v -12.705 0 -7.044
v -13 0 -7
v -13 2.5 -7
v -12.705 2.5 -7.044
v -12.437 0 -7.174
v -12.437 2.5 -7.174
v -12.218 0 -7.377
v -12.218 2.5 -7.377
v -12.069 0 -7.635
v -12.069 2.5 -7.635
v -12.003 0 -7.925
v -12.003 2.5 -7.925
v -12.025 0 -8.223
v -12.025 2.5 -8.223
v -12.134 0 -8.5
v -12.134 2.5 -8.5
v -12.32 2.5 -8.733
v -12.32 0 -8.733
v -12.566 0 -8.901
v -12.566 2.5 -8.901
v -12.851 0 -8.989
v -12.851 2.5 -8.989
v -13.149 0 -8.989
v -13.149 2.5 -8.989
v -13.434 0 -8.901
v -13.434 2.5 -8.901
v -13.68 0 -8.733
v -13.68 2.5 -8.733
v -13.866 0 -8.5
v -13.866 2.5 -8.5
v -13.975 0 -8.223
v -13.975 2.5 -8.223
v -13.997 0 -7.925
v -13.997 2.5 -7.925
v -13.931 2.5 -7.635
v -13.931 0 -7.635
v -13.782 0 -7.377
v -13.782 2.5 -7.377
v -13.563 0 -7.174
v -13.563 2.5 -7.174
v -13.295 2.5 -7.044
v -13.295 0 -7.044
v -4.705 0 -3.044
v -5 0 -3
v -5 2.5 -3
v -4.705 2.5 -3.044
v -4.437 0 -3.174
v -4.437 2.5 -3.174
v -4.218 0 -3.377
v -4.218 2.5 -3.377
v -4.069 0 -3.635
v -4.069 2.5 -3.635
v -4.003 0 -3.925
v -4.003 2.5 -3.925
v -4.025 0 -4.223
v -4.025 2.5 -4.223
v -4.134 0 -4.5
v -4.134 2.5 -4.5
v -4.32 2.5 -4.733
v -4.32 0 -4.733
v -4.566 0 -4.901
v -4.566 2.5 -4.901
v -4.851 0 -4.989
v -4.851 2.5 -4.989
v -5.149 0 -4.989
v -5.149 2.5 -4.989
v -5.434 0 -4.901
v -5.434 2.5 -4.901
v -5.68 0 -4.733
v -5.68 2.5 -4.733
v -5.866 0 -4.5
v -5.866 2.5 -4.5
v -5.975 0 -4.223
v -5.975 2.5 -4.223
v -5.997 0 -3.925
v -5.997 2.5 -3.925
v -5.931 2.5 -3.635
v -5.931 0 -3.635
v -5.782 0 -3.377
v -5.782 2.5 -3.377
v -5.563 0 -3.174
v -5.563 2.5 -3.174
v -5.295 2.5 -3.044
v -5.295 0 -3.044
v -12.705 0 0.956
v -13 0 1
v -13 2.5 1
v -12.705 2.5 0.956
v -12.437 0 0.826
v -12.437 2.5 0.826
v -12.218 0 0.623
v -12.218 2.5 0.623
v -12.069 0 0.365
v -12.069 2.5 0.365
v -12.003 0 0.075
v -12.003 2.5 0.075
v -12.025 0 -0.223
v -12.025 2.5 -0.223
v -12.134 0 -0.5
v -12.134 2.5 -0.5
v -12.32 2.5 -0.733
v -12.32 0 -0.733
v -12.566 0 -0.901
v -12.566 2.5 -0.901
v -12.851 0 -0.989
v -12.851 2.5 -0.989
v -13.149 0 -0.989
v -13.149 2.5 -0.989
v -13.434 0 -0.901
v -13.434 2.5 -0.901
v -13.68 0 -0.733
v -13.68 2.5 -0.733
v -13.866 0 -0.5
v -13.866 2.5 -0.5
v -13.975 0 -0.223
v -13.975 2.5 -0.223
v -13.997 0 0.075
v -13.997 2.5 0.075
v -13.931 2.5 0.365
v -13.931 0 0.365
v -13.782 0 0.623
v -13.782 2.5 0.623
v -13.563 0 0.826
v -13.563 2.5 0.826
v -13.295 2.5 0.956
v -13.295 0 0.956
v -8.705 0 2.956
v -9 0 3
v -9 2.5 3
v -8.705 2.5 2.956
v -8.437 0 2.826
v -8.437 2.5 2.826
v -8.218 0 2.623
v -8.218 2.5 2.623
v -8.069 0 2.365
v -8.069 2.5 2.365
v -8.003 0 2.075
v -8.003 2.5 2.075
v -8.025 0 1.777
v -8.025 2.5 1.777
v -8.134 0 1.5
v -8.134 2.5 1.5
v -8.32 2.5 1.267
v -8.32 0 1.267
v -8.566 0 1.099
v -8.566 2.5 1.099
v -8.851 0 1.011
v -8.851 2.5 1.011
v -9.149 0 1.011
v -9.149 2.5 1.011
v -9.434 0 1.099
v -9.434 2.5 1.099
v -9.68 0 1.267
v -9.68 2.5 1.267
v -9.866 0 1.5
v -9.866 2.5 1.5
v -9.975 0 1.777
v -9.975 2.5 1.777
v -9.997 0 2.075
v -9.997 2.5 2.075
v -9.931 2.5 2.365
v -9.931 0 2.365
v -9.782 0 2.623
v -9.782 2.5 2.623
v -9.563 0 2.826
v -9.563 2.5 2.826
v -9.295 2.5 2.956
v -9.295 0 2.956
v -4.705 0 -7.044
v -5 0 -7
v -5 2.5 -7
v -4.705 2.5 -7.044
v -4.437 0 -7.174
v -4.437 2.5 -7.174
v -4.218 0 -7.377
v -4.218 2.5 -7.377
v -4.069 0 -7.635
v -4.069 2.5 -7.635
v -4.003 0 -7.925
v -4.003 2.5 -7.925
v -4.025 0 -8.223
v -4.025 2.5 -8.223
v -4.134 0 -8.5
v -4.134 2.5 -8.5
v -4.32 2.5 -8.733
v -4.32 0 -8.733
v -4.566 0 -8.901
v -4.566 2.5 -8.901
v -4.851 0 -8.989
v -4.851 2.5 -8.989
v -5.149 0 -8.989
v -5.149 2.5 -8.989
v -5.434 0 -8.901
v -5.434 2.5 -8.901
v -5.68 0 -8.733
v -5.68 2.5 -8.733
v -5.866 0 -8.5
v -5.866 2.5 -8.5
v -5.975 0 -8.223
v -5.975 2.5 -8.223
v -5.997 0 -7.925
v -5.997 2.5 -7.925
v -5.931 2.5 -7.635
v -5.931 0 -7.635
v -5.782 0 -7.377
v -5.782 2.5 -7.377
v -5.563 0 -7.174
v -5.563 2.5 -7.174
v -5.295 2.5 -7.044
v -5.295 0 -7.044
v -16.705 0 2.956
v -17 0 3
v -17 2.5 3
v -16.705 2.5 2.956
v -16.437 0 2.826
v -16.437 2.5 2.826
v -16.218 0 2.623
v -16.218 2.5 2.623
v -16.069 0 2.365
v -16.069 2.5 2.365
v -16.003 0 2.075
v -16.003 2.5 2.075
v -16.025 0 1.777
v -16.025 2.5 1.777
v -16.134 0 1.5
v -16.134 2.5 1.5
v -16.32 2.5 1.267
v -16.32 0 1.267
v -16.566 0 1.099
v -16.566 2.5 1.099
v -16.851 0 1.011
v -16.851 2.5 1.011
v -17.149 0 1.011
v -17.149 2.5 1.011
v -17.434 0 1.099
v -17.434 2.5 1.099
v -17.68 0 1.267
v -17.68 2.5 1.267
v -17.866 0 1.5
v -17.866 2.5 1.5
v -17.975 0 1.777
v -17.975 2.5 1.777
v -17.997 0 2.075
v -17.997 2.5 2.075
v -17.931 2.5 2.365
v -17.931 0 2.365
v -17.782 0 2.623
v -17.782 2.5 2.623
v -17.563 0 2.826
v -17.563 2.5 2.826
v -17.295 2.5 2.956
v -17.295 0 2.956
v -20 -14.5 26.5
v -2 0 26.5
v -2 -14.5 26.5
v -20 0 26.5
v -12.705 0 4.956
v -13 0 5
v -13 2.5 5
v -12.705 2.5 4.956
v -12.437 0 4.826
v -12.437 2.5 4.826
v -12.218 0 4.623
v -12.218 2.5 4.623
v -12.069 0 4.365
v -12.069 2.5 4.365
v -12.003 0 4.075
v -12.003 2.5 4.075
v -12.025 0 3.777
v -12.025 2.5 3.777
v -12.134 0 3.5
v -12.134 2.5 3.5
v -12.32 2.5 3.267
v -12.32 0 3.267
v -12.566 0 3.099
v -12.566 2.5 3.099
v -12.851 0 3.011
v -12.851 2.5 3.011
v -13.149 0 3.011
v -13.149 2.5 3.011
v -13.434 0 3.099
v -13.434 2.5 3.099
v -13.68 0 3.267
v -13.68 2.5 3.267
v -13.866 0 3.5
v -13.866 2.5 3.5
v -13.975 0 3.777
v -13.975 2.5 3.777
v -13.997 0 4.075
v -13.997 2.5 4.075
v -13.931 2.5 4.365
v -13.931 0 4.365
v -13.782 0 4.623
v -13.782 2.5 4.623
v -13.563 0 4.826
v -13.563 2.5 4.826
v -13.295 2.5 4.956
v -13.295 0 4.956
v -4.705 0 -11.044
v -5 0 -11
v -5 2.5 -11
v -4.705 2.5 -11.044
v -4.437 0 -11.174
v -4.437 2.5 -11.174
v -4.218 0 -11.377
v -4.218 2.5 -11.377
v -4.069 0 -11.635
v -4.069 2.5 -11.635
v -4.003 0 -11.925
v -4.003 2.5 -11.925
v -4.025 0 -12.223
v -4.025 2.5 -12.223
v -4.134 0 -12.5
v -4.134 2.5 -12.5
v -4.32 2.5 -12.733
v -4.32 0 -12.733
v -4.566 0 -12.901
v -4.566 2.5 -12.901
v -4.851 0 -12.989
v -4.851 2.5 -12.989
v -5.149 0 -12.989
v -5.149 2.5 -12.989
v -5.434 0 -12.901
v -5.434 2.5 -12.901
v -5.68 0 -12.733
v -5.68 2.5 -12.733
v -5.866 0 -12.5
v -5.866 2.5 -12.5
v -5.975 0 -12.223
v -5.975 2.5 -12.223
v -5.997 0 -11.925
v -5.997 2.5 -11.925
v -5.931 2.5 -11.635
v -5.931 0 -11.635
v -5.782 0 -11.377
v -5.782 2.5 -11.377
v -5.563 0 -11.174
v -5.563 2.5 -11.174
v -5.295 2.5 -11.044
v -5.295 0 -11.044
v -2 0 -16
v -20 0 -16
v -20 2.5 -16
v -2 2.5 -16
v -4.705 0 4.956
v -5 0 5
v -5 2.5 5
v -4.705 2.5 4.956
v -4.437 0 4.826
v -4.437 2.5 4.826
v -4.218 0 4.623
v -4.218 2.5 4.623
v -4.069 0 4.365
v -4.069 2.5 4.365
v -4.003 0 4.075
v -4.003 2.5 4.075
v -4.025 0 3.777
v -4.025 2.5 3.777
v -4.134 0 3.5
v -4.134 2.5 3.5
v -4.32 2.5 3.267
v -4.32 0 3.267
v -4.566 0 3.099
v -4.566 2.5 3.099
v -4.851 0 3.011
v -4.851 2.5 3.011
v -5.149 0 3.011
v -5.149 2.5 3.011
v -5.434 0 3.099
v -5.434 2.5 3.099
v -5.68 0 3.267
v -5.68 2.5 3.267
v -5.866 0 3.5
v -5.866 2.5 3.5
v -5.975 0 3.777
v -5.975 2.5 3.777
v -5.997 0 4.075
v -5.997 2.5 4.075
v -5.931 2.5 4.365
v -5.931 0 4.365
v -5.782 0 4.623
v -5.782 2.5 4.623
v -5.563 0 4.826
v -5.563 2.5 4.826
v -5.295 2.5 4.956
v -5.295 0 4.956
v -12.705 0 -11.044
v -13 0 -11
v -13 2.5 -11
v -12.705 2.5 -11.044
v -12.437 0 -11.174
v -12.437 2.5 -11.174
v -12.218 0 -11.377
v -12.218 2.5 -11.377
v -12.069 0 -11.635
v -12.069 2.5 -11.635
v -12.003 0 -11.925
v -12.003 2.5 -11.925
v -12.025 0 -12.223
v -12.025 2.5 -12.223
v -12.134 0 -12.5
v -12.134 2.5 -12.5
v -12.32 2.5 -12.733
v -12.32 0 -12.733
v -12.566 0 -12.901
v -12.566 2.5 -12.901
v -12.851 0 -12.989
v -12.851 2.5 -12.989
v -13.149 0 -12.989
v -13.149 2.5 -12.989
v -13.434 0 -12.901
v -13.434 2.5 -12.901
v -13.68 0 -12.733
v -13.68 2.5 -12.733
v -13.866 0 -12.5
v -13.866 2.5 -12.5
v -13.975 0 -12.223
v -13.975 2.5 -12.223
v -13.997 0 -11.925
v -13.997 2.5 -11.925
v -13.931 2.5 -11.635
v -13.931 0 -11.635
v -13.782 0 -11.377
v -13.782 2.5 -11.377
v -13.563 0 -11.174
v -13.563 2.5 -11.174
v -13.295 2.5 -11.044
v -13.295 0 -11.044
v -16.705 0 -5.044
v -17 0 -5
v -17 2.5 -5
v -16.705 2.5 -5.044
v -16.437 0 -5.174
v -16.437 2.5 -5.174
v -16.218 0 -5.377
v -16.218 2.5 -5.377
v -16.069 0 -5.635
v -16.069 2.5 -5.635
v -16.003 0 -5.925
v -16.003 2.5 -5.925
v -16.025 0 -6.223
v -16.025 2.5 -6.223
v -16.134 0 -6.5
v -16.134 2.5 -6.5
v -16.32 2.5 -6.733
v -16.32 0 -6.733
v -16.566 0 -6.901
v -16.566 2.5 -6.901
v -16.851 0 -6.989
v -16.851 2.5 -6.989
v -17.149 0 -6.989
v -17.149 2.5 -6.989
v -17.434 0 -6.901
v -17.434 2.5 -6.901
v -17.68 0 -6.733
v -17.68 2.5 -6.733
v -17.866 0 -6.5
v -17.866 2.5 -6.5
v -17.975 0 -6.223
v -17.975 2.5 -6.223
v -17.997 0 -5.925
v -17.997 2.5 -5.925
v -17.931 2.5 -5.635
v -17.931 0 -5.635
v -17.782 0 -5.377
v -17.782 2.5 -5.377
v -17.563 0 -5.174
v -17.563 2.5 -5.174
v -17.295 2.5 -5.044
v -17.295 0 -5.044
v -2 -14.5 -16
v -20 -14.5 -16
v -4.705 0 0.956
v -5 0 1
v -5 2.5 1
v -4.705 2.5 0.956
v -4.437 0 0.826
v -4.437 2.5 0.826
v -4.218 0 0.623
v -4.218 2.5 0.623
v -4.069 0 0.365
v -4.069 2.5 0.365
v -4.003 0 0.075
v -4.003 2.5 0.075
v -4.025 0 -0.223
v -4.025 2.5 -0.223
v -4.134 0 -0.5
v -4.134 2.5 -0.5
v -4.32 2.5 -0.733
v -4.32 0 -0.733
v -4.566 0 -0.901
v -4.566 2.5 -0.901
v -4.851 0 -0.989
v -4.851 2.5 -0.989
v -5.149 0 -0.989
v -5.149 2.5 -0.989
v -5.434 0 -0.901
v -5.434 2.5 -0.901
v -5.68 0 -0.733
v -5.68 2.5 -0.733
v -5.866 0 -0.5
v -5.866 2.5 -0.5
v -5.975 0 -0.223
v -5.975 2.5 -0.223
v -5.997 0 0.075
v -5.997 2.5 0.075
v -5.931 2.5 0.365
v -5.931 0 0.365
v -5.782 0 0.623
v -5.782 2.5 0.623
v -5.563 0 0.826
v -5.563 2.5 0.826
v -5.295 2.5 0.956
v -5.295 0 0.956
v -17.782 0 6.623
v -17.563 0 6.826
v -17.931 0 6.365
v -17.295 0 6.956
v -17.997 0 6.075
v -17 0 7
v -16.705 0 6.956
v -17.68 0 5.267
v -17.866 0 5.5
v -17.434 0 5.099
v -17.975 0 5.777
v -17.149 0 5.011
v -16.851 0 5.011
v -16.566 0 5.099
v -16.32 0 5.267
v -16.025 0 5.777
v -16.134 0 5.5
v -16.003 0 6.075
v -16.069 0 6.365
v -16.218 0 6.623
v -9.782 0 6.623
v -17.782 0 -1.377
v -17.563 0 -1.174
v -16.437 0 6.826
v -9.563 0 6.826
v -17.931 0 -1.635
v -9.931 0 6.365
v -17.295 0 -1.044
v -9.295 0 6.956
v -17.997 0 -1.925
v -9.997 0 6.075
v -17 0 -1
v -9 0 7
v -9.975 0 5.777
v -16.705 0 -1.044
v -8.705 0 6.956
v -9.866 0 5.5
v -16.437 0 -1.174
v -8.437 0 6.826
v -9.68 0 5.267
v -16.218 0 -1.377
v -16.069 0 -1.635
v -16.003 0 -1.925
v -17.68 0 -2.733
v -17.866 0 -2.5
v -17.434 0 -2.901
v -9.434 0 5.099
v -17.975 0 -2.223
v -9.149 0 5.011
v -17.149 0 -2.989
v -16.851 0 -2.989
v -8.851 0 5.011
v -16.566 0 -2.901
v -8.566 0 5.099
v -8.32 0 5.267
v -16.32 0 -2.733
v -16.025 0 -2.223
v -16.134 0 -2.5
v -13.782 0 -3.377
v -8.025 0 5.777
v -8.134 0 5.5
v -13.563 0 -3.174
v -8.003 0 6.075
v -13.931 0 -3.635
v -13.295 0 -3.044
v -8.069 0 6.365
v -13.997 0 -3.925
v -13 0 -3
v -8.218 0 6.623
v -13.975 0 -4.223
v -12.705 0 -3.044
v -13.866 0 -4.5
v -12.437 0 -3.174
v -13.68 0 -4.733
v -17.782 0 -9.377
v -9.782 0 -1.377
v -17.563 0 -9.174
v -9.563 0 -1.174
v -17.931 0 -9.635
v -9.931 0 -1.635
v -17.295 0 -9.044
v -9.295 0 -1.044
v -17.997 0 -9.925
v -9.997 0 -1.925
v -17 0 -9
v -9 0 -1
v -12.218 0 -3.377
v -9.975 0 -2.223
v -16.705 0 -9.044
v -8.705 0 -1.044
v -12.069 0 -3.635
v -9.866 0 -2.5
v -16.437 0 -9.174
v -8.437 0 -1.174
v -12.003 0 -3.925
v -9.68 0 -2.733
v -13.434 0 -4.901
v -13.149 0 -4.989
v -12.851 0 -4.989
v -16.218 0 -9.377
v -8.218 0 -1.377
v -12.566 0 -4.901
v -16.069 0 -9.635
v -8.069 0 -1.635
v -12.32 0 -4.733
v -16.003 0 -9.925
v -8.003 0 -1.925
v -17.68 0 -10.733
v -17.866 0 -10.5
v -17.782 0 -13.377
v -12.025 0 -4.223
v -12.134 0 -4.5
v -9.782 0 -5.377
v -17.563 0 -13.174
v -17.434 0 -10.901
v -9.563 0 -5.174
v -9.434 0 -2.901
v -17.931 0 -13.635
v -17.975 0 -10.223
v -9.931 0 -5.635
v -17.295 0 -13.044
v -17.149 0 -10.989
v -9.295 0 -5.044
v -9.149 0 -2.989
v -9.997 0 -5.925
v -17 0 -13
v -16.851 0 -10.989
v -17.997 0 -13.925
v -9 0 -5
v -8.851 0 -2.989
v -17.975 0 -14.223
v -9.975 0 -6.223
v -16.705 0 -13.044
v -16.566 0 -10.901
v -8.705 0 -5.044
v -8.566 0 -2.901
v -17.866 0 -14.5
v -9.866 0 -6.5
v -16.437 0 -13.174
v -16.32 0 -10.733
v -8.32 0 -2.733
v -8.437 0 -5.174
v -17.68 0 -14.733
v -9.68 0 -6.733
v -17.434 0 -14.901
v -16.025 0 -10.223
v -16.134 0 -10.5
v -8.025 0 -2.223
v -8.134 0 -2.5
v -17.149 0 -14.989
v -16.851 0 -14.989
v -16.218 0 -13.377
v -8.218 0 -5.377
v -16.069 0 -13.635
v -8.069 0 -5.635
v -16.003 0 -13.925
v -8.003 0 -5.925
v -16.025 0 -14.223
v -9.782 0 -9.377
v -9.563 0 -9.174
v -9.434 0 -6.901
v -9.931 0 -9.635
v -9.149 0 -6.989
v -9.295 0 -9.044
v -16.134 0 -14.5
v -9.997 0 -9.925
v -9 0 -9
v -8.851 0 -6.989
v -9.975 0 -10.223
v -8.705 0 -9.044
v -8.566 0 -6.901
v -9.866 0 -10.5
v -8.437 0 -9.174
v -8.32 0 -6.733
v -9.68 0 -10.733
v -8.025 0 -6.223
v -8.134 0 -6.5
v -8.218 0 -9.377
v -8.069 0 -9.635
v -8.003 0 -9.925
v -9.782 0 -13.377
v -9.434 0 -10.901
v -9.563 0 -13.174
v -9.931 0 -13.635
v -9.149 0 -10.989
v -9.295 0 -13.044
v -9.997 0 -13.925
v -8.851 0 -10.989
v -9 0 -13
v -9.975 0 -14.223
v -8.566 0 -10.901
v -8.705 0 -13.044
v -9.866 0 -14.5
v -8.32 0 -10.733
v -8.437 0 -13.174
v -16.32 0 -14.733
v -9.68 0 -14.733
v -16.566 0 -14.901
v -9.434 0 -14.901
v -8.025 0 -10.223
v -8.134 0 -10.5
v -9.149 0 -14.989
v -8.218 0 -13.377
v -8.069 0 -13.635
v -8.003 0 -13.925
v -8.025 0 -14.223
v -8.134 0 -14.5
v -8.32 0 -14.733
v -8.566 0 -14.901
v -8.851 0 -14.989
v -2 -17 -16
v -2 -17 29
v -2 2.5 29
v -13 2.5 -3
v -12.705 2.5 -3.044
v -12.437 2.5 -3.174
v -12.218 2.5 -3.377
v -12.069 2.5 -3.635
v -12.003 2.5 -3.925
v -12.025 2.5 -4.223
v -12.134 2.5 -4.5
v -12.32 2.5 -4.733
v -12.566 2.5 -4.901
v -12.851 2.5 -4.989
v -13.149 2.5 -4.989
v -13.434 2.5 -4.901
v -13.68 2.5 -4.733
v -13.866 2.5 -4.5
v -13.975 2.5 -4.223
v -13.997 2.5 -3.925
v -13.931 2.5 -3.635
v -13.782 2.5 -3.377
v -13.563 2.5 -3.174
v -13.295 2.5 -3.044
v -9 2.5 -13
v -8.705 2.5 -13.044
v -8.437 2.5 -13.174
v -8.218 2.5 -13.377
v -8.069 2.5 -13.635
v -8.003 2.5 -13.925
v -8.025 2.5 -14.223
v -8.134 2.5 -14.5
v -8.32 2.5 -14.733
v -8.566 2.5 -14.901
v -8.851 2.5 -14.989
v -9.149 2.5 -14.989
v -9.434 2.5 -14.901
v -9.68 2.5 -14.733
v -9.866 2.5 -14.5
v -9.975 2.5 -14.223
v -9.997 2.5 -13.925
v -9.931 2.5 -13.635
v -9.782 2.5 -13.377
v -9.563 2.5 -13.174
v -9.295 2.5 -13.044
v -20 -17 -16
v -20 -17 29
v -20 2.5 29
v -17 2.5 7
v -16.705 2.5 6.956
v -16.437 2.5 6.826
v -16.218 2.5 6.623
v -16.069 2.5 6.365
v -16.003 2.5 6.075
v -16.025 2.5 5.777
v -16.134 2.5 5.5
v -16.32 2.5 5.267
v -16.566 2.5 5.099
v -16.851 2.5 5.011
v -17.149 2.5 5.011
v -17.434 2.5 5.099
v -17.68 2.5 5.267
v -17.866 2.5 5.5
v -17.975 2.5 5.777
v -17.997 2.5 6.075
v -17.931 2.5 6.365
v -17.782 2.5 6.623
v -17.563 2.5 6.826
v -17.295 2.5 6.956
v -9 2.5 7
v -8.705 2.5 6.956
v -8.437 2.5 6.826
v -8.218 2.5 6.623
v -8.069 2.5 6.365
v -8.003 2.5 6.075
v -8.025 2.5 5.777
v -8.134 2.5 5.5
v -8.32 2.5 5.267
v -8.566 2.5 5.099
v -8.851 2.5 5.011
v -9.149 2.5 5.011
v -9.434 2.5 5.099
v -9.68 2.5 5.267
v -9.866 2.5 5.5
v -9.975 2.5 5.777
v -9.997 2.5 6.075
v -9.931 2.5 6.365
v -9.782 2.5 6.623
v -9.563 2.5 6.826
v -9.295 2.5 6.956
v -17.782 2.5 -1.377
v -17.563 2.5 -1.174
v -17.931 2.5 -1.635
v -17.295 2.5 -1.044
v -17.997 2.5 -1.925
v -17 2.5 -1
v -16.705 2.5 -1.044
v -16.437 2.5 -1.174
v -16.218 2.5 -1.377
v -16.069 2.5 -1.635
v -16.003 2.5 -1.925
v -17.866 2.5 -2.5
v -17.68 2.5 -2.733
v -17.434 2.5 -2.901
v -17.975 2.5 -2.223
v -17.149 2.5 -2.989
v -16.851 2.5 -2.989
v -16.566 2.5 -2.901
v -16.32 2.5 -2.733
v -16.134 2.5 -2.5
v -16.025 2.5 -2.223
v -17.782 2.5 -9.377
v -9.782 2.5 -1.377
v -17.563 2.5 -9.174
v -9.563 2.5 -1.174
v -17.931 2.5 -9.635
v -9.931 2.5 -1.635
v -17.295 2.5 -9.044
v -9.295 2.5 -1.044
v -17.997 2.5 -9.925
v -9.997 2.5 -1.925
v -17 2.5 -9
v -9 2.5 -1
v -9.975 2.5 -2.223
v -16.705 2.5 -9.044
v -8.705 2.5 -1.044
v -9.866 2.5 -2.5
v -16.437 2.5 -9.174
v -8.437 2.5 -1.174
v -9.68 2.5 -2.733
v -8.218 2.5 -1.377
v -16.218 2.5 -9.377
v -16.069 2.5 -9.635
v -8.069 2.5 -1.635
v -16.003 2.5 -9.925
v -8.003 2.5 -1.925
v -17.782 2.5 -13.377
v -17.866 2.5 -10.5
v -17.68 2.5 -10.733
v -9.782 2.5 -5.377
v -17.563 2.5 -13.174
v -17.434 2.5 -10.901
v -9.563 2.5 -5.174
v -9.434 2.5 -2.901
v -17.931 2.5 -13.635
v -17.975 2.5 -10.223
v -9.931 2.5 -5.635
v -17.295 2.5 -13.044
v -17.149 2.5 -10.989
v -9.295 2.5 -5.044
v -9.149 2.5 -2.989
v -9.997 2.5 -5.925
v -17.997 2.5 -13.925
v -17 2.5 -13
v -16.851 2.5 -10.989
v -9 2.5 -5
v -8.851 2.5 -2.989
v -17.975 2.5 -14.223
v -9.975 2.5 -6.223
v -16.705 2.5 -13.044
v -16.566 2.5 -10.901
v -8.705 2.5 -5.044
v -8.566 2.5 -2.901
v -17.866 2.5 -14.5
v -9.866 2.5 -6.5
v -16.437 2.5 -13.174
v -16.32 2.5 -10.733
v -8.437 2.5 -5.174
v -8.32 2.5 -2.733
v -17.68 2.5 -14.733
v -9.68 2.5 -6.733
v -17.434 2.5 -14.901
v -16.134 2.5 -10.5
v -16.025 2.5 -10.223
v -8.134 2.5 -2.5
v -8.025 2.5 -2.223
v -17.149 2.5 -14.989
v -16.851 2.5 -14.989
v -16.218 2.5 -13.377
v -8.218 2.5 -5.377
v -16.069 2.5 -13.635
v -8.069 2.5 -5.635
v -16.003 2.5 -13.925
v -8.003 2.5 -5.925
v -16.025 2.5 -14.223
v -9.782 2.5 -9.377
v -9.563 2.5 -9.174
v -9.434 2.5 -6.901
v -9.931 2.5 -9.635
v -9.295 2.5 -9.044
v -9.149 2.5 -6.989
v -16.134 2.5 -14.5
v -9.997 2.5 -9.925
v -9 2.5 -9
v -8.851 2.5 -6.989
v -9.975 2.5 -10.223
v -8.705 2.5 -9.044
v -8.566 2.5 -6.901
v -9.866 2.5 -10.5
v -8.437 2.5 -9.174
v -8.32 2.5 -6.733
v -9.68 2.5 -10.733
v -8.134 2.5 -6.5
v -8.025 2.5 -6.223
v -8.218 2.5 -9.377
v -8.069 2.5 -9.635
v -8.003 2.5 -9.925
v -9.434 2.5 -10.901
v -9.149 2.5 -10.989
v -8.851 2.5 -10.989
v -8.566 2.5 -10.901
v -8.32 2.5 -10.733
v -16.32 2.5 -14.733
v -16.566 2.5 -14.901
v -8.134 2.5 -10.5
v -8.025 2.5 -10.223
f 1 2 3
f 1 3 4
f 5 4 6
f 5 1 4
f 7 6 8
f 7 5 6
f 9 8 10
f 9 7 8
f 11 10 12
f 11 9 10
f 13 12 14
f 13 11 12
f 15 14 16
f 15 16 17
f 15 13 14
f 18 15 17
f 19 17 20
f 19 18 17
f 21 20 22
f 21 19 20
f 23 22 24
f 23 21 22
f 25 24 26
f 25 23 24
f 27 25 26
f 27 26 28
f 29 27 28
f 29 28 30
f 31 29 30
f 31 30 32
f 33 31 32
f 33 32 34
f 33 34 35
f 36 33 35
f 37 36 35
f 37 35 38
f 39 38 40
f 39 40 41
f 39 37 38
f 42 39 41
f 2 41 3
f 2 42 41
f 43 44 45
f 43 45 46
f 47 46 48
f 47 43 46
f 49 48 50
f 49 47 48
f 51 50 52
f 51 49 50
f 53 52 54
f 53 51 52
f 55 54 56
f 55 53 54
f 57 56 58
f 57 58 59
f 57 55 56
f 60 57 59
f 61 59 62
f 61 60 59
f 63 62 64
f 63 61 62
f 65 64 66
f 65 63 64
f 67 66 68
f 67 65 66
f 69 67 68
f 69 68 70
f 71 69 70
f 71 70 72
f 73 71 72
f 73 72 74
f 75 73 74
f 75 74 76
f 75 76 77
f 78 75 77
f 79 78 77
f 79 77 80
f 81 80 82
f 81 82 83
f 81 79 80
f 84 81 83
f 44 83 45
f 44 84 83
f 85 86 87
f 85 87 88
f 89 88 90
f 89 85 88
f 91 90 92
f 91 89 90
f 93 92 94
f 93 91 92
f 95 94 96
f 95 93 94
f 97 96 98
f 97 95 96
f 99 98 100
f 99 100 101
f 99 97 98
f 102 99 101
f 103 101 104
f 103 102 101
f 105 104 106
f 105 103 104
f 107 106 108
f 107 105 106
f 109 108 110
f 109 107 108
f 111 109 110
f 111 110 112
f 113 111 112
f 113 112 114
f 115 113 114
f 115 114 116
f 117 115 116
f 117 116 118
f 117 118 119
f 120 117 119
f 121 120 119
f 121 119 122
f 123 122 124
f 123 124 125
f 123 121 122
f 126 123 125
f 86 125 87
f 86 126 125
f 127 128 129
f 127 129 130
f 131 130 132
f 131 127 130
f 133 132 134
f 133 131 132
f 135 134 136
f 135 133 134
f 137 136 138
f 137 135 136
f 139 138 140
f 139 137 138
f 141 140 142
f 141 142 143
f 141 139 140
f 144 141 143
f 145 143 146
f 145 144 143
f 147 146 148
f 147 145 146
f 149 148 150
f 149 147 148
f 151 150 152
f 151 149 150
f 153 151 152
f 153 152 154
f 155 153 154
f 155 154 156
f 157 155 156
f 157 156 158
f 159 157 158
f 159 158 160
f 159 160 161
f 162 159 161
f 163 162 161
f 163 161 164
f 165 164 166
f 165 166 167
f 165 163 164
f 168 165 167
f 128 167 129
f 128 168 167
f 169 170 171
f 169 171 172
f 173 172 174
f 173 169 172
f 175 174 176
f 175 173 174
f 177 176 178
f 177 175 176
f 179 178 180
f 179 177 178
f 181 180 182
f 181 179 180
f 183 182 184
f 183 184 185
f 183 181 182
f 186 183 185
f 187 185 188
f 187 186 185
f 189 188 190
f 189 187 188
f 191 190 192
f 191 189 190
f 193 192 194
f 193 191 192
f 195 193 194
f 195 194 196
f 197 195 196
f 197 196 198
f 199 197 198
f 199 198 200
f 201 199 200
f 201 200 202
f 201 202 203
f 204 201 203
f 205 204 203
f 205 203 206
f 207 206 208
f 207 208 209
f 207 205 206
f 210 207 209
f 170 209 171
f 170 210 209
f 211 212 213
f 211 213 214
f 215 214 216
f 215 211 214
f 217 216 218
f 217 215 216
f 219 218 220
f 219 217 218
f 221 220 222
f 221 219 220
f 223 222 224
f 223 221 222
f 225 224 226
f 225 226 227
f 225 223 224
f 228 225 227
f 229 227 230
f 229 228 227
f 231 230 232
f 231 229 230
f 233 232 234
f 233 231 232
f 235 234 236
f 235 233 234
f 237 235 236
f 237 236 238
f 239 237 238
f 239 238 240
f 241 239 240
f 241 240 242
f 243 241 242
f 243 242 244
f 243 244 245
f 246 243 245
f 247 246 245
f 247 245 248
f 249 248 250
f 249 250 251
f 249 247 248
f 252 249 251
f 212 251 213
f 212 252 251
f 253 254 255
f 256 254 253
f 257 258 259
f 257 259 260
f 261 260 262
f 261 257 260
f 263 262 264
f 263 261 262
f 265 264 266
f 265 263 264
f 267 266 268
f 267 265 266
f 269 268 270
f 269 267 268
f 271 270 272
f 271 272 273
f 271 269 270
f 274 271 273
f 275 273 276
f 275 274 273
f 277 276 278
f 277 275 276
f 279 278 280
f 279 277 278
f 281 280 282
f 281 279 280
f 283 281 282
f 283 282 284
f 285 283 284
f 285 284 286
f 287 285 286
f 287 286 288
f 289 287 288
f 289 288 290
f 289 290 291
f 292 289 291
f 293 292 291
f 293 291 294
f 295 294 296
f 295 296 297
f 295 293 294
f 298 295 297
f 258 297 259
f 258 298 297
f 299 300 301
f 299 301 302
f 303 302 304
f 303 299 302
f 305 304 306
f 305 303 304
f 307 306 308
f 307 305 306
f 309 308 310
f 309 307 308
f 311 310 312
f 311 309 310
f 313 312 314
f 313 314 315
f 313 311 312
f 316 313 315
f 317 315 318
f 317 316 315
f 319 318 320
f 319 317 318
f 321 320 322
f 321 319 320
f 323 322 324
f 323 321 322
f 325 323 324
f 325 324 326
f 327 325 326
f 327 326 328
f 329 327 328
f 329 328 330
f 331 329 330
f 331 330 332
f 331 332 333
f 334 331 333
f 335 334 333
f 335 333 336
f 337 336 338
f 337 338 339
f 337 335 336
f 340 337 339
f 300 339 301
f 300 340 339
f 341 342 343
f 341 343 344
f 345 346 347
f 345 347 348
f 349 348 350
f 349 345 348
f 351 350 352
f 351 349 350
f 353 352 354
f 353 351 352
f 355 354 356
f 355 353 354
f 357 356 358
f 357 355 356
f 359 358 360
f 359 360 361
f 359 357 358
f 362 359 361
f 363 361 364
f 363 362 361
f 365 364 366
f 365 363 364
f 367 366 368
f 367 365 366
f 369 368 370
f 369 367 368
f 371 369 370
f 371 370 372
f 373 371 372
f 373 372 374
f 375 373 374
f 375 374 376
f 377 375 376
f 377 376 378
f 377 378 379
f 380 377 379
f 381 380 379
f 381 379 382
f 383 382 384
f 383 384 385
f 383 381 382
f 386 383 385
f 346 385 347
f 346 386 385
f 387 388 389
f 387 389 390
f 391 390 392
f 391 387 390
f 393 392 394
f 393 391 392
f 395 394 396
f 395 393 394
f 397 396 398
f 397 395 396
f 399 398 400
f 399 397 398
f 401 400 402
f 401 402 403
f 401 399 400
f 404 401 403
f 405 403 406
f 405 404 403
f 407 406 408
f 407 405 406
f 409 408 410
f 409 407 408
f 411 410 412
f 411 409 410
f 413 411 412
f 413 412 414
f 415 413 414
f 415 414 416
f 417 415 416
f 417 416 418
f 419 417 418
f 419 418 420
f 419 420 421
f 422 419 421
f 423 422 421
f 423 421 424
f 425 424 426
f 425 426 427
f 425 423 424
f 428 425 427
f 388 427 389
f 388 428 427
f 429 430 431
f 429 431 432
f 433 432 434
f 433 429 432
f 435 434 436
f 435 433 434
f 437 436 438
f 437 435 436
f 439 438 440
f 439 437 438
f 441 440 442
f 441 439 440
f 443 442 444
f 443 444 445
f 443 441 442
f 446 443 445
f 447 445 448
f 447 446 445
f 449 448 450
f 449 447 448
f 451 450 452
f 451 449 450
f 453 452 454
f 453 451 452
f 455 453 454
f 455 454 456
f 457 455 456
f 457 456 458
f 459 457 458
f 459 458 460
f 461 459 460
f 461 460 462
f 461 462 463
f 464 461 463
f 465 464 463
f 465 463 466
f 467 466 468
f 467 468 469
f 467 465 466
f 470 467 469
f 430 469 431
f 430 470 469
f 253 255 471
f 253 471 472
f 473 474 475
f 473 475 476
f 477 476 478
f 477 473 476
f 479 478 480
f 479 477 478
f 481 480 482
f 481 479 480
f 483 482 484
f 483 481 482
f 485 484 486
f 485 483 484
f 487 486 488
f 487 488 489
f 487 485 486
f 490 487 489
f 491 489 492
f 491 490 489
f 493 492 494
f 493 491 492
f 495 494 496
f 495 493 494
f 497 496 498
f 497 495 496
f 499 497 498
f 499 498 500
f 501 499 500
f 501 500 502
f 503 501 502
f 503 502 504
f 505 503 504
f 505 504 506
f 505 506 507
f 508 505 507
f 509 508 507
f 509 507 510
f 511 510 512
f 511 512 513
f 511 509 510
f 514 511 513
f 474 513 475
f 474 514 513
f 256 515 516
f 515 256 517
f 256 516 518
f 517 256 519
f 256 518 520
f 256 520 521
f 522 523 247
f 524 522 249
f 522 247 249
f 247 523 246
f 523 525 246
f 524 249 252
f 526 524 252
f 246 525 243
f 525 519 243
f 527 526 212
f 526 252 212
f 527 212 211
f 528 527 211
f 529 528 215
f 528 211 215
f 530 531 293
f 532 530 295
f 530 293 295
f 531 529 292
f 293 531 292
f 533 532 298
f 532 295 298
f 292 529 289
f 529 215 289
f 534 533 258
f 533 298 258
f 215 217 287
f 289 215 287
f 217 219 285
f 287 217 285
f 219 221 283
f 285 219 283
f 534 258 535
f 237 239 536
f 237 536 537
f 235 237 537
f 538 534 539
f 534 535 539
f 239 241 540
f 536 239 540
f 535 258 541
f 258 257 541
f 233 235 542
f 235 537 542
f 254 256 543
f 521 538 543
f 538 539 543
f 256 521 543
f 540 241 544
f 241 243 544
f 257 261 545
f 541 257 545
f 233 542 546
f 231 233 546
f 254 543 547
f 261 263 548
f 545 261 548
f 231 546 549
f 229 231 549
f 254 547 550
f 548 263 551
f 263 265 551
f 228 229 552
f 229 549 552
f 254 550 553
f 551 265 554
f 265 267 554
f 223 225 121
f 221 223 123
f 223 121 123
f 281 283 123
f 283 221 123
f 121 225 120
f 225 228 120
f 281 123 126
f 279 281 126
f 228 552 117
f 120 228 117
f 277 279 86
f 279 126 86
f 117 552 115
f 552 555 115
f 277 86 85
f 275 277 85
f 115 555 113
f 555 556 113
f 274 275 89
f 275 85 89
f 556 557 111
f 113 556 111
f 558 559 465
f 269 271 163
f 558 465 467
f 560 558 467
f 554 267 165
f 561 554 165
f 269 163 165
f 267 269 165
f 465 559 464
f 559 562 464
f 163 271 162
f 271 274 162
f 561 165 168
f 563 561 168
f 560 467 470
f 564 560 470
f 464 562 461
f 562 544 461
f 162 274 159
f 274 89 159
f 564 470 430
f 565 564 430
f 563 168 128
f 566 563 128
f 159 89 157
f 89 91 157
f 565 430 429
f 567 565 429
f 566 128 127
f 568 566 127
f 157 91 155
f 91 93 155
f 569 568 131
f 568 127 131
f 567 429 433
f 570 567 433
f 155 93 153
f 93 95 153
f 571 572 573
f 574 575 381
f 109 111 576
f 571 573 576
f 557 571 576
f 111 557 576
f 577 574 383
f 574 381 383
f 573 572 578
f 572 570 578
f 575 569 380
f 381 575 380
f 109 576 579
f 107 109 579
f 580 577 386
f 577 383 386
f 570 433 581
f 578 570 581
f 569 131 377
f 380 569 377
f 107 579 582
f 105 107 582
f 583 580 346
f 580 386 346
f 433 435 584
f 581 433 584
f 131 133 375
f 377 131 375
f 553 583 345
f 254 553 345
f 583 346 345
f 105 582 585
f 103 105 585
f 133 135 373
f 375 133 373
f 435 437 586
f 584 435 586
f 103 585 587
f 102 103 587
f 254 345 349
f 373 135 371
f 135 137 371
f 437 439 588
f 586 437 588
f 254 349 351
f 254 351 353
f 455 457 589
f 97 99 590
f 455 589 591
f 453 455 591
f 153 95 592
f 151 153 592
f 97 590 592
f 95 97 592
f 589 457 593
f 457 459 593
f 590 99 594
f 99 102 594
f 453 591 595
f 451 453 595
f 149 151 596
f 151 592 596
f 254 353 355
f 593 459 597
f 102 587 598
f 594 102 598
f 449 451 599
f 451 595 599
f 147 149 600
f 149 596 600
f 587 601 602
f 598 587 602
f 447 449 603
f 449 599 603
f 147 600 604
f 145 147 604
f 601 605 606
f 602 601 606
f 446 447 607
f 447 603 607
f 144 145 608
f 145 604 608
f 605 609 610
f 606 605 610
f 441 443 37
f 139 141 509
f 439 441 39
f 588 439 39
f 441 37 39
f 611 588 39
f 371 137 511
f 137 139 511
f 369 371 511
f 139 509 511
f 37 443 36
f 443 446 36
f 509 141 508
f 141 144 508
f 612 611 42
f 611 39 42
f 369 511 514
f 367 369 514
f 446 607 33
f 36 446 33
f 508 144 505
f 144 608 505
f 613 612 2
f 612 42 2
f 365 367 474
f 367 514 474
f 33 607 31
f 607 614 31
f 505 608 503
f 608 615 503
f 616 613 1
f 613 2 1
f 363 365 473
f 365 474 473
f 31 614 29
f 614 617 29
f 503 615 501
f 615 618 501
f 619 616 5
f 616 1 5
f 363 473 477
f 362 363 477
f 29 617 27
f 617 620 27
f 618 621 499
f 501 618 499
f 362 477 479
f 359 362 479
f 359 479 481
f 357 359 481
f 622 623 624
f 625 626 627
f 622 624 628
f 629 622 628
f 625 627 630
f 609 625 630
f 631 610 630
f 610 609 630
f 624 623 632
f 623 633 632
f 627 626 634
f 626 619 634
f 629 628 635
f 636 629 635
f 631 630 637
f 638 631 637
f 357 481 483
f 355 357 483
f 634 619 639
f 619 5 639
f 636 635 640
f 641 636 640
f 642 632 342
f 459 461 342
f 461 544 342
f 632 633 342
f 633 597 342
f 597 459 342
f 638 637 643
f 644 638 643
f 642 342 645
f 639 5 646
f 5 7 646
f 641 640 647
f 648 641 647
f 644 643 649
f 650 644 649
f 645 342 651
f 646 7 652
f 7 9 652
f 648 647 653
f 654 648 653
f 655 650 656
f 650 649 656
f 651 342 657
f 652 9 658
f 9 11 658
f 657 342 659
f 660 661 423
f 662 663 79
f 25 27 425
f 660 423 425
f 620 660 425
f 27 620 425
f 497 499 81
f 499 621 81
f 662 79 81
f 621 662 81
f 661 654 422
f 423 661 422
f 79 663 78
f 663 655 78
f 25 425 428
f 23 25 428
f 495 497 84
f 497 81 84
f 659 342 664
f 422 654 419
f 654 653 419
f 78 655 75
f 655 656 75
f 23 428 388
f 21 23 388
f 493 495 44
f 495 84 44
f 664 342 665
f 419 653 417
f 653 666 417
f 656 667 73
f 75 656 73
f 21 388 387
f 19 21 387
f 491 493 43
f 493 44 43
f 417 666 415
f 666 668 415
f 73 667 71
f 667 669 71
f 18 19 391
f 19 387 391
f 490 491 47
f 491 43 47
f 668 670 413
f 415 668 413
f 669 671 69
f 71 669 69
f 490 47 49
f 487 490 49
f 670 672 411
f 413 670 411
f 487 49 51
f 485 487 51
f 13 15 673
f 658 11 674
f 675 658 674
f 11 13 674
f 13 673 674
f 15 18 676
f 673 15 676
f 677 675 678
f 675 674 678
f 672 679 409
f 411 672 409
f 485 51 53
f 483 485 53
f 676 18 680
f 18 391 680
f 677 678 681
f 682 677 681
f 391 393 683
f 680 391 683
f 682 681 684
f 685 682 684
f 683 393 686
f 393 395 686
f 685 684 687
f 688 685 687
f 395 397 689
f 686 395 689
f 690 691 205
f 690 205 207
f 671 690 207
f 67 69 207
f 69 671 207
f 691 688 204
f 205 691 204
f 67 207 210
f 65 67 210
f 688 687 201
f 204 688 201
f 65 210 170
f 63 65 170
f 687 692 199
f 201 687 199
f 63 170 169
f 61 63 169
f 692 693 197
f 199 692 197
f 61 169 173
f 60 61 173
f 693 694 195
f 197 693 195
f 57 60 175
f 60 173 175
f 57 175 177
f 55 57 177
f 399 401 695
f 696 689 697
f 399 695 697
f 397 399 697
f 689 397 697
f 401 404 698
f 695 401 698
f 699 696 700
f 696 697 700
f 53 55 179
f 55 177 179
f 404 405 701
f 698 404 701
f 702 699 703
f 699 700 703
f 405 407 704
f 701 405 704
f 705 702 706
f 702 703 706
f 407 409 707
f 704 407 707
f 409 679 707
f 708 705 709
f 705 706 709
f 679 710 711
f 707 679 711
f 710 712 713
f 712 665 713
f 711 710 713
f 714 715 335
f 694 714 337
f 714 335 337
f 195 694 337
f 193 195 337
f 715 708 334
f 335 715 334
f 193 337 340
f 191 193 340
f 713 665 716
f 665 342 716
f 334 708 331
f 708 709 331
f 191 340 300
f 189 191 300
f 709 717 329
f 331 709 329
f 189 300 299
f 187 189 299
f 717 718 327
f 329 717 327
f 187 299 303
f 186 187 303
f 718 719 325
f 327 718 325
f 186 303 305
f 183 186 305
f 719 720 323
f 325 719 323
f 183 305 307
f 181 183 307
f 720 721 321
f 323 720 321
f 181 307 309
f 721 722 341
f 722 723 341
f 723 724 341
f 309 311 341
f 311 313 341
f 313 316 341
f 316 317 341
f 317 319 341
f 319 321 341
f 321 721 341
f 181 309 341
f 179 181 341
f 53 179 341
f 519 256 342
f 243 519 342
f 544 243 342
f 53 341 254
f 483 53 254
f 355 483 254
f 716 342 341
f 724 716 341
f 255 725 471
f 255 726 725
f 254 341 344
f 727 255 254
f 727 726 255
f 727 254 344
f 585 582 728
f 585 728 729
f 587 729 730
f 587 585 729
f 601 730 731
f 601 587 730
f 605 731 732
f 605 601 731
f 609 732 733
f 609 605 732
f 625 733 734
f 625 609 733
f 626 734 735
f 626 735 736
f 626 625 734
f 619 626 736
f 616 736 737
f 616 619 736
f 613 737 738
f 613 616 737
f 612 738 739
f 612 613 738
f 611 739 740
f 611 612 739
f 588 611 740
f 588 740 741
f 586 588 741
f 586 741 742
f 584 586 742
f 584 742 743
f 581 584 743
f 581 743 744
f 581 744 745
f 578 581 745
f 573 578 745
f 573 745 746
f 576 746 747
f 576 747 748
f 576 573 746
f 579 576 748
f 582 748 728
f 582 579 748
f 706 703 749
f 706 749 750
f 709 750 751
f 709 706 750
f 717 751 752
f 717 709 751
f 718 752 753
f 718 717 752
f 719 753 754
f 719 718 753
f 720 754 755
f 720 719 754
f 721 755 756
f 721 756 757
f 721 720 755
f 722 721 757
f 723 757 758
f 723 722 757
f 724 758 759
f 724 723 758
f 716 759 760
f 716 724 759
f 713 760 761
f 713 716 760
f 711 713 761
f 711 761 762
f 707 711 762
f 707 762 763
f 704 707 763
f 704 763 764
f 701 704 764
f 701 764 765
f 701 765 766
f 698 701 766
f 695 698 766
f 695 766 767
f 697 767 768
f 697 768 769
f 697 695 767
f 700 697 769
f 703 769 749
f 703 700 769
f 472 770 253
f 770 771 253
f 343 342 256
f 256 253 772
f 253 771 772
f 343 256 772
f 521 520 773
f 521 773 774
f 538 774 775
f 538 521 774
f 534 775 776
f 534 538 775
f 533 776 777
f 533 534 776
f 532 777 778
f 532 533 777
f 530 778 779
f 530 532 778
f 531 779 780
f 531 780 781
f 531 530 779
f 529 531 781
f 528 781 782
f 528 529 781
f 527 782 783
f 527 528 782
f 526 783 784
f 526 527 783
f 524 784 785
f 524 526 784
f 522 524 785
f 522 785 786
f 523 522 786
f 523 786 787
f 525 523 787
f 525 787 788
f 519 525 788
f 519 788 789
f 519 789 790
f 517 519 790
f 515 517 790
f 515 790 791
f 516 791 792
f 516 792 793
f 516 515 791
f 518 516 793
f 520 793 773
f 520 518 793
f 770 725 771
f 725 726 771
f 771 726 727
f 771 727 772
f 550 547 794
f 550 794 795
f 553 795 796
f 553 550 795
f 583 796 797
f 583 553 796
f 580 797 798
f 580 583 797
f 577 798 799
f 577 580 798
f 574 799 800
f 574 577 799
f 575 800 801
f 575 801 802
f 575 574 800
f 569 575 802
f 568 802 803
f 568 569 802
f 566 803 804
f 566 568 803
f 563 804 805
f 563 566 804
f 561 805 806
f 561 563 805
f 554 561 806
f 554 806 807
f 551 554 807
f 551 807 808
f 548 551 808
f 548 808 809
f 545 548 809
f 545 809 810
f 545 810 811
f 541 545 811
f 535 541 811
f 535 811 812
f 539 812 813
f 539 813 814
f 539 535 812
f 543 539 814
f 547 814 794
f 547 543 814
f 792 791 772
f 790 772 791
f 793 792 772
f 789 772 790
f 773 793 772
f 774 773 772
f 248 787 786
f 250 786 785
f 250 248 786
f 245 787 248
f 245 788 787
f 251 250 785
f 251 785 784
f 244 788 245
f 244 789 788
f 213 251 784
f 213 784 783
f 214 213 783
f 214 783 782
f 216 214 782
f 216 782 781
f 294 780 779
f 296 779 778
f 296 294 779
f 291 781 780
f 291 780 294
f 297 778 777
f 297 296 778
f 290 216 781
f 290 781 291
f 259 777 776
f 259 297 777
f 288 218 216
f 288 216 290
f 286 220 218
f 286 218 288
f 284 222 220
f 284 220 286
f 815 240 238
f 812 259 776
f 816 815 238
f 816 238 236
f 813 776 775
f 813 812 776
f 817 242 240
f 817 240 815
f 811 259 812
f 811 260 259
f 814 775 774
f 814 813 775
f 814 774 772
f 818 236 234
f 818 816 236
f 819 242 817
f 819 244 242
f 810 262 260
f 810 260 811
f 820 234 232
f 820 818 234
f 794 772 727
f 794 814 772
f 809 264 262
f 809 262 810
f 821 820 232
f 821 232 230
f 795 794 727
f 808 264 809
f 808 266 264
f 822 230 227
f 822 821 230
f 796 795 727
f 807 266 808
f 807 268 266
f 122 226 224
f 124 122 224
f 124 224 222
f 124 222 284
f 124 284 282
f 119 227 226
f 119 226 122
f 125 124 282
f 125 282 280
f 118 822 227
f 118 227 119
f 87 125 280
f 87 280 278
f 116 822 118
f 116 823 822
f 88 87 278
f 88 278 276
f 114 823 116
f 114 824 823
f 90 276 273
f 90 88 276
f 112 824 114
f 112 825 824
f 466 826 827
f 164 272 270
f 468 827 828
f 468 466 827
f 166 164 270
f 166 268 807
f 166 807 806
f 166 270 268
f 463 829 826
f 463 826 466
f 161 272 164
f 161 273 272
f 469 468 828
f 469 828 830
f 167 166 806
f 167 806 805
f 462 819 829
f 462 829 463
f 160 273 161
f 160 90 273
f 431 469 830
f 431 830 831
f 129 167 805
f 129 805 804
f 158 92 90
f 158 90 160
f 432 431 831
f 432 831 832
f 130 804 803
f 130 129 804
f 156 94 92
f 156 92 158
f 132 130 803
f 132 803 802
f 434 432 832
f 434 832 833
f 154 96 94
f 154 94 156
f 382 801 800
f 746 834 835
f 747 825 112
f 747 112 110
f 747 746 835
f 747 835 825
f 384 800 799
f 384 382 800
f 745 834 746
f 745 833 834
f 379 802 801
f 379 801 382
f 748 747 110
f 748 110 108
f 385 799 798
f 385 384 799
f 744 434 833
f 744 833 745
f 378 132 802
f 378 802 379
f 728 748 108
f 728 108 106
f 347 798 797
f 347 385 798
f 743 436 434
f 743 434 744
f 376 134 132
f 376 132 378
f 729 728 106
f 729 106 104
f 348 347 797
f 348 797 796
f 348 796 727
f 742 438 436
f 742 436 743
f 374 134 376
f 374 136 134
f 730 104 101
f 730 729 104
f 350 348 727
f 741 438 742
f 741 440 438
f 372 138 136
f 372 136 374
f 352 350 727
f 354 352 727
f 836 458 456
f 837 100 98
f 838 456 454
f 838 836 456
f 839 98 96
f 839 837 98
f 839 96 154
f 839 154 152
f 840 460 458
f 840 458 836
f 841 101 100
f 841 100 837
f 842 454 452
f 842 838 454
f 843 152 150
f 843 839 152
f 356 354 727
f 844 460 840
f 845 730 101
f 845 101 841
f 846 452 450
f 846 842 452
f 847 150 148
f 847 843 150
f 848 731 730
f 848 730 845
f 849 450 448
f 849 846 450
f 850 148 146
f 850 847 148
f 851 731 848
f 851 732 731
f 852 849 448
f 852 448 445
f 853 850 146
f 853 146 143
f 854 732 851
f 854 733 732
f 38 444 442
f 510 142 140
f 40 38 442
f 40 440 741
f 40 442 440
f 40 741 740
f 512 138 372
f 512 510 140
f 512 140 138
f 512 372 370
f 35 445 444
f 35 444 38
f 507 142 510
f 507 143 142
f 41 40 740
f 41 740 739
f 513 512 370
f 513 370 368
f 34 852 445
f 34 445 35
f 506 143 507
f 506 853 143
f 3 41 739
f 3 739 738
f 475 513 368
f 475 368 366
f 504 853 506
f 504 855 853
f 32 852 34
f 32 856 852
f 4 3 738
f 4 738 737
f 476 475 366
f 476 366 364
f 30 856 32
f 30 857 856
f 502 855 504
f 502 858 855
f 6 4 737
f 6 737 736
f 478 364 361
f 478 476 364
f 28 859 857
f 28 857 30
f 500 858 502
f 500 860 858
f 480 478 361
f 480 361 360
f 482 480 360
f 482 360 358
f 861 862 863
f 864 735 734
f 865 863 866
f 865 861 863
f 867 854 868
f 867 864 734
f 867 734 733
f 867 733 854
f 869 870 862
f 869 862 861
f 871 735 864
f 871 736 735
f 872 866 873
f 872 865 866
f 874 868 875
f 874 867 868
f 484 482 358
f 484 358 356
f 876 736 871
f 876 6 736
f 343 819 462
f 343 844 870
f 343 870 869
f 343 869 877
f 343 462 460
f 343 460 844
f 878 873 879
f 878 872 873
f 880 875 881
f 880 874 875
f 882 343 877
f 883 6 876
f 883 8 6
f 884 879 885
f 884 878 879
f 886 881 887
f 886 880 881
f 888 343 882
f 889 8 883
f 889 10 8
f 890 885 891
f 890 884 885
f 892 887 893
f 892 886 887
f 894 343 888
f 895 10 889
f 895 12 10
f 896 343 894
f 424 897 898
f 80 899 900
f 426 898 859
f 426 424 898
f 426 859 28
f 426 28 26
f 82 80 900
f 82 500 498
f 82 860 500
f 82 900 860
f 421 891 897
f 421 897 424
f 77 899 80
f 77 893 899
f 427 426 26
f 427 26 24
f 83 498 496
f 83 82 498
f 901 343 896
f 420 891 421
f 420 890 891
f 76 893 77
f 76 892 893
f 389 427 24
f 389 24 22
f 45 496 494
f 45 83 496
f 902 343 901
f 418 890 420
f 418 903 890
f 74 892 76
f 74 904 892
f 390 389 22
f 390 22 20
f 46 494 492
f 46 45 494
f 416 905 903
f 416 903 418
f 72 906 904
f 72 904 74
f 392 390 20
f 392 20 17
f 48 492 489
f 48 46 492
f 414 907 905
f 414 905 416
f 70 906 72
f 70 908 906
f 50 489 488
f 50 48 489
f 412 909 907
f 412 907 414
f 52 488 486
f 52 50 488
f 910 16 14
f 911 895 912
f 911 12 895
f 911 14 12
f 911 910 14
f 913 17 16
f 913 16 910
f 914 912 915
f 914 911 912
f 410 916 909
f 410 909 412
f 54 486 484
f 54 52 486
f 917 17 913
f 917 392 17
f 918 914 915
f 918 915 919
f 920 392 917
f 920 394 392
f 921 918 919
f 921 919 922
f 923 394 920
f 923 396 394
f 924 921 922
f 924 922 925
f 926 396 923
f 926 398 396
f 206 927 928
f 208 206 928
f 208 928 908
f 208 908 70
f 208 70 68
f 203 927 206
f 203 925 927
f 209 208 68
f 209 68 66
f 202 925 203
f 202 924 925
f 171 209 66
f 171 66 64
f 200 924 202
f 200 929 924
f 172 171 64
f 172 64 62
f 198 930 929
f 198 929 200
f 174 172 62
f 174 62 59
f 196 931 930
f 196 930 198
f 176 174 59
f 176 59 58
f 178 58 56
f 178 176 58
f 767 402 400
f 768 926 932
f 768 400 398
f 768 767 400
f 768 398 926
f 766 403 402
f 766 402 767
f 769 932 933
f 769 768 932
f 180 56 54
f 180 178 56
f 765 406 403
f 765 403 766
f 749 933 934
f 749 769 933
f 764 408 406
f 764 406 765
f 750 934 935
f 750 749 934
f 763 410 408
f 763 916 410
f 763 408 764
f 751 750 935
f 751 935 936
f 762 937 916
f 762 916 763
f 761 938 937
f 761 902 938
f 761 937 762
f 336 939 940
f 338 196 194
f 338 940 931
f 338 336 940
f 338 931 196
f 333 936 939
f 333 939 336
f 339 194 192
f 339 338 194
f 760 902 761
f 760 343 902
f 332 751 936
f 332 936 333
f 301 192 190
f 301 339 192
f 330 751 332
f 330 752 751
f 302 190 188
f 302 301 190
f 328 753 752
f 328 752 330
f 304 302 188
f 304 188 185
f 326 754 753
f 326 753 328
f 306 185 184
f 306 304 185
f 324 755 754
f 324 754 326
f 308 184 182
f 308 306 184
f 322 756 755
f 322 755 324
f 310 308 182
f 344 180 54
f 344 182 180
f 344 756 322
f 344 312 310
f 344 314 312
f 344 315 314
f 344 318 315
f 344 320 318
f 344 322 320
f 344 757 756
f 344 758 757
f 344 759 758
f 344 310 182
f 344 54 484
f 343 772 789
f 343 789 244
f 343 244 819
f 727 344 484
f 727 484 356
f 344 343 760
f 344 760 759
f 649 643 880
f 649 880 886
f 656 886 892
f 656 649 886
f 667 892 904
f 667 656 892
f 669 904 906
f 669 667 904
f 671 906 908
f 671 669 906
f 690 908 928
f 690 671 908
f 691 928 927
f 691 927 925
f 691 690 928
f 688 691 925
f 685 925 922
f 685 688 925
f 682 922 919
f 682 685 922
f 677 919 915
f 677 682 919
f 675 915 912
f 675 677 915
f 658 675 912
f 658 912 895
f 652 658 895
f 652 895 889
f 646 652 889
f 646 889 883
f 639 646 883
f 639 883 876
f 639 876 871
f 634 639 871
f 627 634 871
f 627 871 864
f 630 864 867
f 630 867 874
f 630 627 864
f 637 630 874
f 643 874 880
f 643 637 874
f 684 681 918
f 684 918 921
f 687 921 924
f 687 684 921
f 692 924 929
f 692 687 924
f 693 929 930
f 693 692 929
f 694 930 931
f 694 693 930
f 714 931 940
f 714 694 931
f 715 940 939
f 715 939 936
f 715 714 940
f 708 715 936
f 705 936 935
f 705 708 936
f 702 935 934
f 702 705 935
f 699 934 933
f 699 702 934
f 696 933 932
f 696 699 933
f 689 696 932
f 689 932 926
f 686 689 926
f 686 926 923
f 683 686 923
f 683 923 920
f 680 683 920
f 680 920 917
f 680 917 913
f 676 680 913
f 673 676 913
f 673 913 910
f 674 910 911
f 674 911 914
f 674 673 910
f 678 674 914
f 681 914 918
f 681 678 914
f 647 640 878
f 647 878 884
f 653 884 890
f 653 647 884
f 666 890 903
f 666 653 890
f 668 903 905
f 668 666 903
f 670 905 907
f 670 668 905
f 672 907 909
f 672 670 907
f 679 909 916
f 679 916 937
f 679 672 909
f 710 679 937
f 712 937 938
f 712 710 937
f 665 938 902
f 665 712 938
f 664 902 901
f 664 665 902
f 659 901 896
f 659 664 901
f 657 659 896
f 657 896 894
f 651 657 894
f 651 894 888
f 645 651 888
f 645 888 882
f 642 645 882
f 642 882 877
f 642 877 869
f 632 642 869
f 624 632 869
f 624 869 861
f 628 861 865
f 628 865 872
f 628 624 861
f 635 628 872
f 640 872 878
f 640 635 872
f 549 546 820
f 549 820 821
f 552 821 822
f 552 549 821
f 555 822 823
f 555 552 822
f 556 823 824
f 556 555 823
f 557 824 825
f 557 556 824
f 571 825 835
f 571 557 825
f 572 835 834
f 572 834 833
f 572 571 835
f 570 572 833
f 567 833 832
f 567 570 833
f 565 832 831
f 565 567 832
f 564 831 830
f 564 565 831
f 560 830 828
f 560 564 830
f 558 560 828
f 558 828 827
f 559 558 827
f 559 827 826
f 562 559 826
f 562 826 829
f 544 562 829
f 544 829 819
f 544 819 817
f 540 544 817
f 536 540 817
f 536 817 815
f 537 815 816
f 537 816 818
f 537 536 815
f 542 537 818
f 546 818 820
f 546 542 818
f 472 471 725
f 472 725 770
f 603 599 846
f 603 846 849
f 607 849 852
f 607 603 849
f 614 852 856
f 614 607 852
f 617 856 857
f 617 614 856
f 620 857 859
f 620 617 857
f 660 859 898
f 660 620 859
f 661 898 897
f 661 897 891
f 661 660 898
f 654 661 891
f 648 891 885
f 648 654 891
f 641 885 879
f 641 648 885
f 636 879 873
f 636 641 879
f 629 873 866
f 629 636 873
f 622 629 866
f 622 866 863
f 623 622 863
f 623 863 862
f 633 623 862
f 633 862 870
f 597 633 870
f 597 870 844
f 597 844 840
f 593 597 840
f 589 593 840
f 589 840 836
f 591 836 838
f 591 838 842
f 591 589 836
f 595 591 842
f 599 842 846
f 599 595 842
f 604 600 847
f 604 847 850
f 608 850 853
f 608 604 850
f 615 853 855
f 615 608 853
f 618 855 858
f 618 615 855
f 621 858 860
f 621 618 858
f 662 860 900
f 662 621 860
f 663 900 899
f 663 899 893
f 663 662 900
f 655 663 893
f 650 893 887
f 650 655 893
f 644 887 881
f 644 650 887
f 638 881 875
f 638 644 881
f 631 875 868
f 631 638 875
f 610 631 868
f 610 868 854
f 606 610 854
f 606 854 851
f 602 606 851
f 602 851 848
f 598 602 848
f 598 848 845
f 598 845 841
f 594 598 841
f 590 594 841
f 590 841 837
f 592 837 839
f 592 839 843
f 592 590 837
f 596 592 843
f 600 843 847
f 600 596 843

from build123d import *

# Parameters (mm, degrees)
SKETCH2_W           = 18
SKETCH2_H           = 24
SKETCH2_R           = 1
BOSS_EXTRUDE2_DEPTH = 2.5
SKETCH3_W           = 18
SKETCH3_H           = 2.5
BOSS_EXTRUDE3_DEPTH = 21
SKETCH4_W           = 18
SKETCH4_H           = 2.5
BOSS_EXTRUDE4_DEPTH = 17
SKETCH5_W           = 18
SKETCH5_H           = 2.5
BOSS_EXTRUDE5_DEPTH = 42.5


with BuildPart() as part:
    # Sketch2 → Boss-Extrude2 (new body)
    with BuildSketch(Plane(origin=(0, 0, 0), x_dir=(1, 0, 0), z_dir=(0, 1, 0))):
        with Locations((-11, 4)):
            Rectangle(SKETCH2_W, SKETCH2_H)
        with Locations(Location((-17, -6, 0), (0, 0, 270))):
            Circle(SKETCH2_R, mode=Mode.SUBTRACT)
        with Locations(Location((-17, -2, 0), (0, 0, 270))):
            Circle(SKETCH2_R, mode=Mode.SUBTRACT)
        with Locations(Location((-17, 2, 0), (0, 0, 270))):
            Circle(SKETCH2_R, mode=Mode.SUBTRACT)
        with Locations(Location((-17, 6, 0), (0, 0, 270))):
            Circle(SKETCH2_R, mode=Mode.SUBTRACT)
        with Locations(Location((-17, 10, 0), (0, 0, 270))):
            Circle(SKETCH2_R, mode=Mode.SUBTRACT)
        with Locations(Location((-17, 14, 0), (0, 0, 270))):
            Circle(SKETCH2_R, mode=Mode.SUBTRACT)
        with Locations(Location((-13, -4, 0), (0, 0, 270))):
            Circle(SKETCH2_R, mode=Mode.SUBTRACT)
        with Locations(Location((-13, 0, 0), (0, 0, 270))):
            Circle(SKETCH2_R, mode=Mode.SUBTRACT)
        with Locations(Location((-13, 4, 0), (0, 0, 270))):
            Circle(SKETCH2_R, mode=Mode.SUBTRACT)
        with Locations(Location((-13, 8, 0), (0, 0, 270))):
            Circle(SKETCH2_R, mode=Mode.SUBTRACT)
        with Locations(Location((-13, 12, 0), (0, 0, 270))):
            Circle(SKETCH2_R, mode=Mode.SUBTRACT)
        with Locations(Location((-9, -6, 0), (0, 0, 270))):
            Circle(SKETCH2_R, mode=Mode.SUBTRACT)
        with Locations(Location((-9, -2, 0), (0, 0, 270))):
            Circle(SKETCH2_R, mode=Mode.SUBTRACT)
        with Locations(Location((-9, 2, 0), (0, 0, 270))):
            Circle(SKETCH2_R, mode=Mode.SUBTRACT)
        with Locations(Location((-9, 6, 0), (0, 0, 270))):
            Circle(SKETCH2_R, mode=Mode.SUBTRACT)
        with Locations(Location((-9, 10, 0), (0, 0, 270))):
            Circle(SKETCH2_R, mode=Mode.SUBTRACT)
        with Locations(Location((-9, 14, 0), (0, 0, 270))):
            Circle(SKETCH2_R, mode=Mode.SUBTRACT)
        with Locations(Location((-5, -4, 0), (0, 0, 270))):
            Circle(SKETCH2_R, mode=Mode.SUBTRACT)
        with Locations(Location((-5, 0, 0), (0, 0, 270))):
            Circle(SKETCH2_R, mode=Mode.SUBTRACT)
        with Locations(Location((-5, 4, 0), (0, 0, 270))):
            Circle(SKETCH2_R, mode=Mode.SUBTRACT)
        with Locations(Location((-5, 8, 0), (0, 0, 270))):
            Circle(SKETCH2_R, mode=Mode.SUBTRACT)
        with Locations(Location((-5, 12, 0), (0, 0, 270))):
            Circle(SKETCH2_R, mode=Mode.SUBTRACT)
    extrude(amount=BOSS_EXTRUDE2_DEPTH)

    # Sketch3 → Boss-Extrude3 (add)
    with BuildSketch(Plane.XY.offset(8)):
        with Locations((-11, 1.25)):
            Rectangle(SKETCH3_W, SKETCH3_H)
    extrude(amount=BOSS_EXTRUDE3_DEPTH)

    # Sketch4 → Boss-Extrude4 (add)
    with BuildSketch(Plane(origin=(0, 0, 0), x_dir=(-1, 0, 0), z_dir=(0, -1, 0))):
        with Locations((11, -27.75)):
            Rectangle(SKETCH4_W, SKETCH4_H)
    extrude(amount=BOSS_EXTRUDE4_DEPTH)

    # Sketch5 → Boss-Extrude5 (add)
    with BuildSketch(Plane(origin=(0, 0, 26.5), x_dir=(-1, 0, 0), z_dir=(0, 0, -1))):
        with Locations((11, -15.75)):
            Rectangle(SKETCH5_W, SKETCH5_H)
    extrude(amount=BOSS_EXTRUDE5_DEPTH)


solid = part.part
